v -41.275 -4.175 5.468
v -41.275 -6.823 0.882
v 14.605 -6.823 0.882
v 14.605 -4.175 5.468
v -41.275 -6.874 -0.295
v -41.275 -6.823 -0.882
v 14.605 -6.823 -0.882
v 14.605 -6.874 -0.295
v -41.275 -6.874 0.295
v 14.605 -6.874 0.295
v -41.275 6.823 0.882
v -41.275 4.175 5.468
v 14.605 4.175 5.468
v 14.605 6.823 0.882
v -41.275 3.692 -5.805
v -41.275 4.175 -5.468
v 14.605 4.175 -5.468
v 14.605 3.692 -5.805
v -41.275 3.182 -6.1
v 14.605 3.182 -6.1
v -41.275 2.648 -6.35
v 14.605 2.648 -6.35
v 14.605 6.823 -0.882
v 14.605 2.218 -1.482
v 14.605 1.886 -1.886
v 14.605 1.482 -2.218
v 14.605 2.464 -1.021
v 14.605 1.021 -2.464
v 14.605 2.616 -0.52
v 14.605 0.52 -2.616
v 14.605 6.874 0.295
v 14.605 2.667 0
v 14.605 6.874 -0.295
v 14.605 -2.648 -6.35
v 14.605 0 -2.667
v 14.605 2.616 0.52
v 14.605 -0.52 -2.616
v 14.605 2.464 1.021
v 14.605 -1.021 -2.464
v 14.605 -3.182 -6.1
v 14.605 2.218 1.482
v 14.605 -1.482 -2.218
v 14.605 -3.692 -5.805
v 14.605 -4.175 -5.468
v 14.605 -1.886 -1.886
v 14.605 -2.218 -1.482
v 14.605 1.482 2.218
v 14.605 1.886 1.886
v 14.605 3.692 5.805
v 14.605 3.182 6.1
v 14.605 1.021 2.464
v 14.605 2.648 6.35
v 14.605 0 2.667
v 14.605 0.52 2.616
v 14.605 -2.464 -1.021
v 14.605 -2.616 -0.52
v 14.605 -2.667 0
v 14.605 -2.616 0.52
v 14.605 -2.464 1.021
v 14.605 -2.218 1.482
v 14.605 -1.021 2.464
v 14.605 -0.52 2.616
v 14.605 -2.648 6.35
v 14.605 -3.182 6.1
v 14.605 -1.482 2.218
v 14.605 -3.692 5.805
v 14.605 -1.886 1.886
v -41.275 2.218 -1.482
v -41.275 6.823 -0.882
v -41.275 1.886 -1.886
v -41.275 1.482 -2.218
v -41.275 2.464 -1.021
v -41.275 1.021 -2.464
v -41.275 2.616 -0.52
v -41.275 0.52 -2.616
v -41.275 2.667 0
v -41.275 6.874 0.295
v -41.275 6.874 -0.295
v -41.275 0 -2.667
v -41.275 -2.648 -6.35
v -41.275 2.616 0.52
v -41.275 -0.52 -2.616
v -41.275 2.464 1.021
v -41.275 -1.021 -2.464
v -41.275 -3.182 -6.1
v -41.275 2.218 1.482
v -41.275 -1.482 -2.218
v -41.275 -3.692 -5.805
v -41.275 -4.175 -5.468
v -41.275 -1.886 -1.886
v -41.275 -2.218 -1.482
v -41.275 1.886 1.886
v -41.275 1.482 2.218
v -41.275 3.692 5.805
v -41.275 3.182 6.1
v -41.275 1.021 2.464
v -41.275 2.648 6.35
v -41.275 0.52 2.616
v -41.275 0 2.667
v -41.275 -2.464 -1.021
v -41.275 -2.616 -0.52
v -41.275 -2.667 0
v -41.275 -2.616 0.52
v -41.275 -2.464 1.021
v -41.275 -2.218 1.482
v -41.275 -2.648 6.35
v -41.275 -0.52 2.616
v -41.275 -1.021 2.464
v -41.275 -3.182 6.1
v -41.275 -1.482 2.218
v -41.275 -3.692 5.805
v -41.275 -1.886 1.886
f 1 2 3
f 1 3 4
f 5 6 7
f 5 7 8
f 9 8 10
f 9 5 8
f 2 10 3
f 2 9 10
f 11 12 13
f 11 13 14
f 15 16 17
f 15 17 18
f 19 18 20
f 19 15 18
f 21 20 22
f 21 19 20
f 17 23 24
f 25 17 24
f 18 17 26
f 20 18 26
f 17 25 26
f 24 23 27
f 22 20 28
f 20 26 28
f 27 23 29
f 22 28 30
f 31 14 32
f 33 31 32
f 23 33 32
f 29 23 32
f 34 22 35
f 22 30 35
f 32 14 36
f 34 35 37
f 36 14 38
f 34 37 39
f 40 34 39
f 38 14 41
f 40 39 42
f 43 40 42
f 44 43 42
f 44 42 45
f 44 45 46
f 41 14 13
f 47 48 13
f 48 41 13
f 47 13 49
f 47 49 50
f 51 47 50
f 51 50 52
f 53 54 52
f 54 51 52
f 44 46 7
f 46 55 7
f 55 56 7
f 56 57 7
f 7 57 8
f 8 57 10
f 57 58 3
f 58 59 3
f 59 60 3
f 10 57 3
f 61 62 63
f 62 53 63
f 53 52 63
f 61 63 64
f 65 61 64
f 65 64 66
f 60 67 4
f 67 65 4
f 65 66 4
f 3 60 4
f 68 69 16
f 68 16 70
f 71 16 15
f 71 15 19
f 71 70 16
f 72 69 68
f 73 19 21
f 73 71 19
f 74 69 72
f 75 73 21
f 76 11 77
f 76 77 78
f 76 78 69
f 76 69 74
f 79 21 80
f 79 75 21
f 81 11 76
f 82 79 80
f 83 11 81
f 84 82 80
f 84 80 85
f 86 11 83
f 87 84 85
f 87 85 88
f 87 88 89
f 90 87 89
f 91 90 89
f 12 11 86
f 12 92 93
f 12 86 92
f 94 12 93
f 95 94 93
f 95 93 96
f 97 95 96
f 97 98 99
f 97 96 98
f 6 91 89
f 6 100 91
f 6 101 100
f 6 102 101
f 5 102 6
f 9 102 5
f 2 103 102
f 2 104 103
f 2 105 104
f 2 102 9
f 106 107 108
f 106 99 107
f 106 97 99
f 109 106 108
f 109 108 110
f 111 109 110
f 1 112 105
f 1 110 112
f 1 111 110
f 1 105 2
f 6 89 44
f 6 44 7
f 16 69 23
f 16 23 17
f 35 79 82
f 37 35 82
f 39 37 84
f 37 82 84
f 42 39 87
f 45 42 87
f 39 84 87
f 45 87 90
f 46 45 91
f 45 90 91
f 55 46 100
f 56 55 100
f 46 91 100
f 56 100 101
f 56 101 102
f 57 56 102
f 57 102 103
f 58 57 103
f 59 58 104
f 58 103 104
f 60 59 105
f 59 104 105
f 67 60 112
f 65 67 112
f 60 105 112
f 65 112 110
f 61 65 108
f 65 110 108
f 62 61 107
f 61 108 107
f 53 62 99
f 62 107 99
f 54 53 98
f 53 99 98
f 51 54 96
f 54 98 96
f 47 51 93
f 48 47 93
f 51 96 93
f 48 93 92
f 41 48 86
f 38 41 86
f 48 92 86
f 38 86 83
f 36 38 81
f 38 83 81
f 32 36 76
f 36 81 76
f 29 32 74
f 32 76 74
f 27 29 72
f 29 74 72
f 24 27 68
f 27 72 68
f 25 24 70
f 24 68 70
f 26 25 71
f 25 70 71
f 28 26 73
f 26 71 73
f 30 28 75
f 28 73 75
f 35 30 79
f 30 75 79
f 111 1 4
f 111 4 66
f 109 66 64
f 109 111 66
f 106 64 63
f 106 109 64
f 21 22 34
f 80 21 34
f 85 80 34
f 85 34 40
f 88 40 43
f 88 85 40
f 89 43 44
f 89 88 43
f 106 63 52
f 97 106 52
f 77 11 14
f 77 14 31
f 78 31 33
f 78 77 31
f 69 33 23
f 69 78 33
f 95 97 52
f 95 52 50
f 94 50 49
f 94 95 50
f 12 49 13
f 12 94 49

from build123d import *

# Parameters (mm, degrees)
SKETCH1_R           = 2.667
BOSS_EXTRUDE1_DEPTH = 55.88


with BuildPart() as part:
    # Sketch1 → Boss-Extrude1 (new body)
    with BuildSketch(Plane(origin=(-41.275, 0, 0), x_dir=(0, -1, 0), z_dir=(-1, 0, 0))):
        with BuildLine():
            Line((4.175261692, -5.468234615), (6.823260936, -0.881765385))
            ThreePointArc((6.823260936, -0.881765385), (6.88, 0), (6.823260936, 0.881765385))
            Line((6.823260936, 0.881765385), (4.175261692, 5.468234615))
            ThreePointArc((4.175261692, 5.468234615), (3.44, 5.958254778), (2.647999245, 6.35))
            Line((2.647999245, 6.35), (-2.647999245, 6.35))
            ThreePointArc((-2.647999245, 6.35), (-3.44, 5.958254778), (-4.175261692, 5.468234615))
            Line((-4.175261692, 5.468234615), (-6.823260936, 0.881765385))
            ThreePointArc((-6.823260936, 0.881765385), (-6.88, 0), (-6.823260936, -0.881765385))
            Line((-6.823260936, -0.881765385), (-4.175261692, -5.468234615))
            ThreePointArc((-4.175261692, -5.468234615), (-3.44, -5.958254778), (-2.647999245, -6.35))
            Line((-2.647999245, -6.35), (2.647999245, -6.35))
            ThreePointArc((2.647999245, -6.35), (3.44, -5.958254778), (4.175261692, -5.468234615))
        make_face()
        with Locations(Location((0, 0, 0), (0, 0, 270))):
            Circle(SKETCH1_R, mode=Mode.SUBTRACT)
    extrude(amount=-BOSS_EXTRUDE1_DEPTH)


solid = part.part
